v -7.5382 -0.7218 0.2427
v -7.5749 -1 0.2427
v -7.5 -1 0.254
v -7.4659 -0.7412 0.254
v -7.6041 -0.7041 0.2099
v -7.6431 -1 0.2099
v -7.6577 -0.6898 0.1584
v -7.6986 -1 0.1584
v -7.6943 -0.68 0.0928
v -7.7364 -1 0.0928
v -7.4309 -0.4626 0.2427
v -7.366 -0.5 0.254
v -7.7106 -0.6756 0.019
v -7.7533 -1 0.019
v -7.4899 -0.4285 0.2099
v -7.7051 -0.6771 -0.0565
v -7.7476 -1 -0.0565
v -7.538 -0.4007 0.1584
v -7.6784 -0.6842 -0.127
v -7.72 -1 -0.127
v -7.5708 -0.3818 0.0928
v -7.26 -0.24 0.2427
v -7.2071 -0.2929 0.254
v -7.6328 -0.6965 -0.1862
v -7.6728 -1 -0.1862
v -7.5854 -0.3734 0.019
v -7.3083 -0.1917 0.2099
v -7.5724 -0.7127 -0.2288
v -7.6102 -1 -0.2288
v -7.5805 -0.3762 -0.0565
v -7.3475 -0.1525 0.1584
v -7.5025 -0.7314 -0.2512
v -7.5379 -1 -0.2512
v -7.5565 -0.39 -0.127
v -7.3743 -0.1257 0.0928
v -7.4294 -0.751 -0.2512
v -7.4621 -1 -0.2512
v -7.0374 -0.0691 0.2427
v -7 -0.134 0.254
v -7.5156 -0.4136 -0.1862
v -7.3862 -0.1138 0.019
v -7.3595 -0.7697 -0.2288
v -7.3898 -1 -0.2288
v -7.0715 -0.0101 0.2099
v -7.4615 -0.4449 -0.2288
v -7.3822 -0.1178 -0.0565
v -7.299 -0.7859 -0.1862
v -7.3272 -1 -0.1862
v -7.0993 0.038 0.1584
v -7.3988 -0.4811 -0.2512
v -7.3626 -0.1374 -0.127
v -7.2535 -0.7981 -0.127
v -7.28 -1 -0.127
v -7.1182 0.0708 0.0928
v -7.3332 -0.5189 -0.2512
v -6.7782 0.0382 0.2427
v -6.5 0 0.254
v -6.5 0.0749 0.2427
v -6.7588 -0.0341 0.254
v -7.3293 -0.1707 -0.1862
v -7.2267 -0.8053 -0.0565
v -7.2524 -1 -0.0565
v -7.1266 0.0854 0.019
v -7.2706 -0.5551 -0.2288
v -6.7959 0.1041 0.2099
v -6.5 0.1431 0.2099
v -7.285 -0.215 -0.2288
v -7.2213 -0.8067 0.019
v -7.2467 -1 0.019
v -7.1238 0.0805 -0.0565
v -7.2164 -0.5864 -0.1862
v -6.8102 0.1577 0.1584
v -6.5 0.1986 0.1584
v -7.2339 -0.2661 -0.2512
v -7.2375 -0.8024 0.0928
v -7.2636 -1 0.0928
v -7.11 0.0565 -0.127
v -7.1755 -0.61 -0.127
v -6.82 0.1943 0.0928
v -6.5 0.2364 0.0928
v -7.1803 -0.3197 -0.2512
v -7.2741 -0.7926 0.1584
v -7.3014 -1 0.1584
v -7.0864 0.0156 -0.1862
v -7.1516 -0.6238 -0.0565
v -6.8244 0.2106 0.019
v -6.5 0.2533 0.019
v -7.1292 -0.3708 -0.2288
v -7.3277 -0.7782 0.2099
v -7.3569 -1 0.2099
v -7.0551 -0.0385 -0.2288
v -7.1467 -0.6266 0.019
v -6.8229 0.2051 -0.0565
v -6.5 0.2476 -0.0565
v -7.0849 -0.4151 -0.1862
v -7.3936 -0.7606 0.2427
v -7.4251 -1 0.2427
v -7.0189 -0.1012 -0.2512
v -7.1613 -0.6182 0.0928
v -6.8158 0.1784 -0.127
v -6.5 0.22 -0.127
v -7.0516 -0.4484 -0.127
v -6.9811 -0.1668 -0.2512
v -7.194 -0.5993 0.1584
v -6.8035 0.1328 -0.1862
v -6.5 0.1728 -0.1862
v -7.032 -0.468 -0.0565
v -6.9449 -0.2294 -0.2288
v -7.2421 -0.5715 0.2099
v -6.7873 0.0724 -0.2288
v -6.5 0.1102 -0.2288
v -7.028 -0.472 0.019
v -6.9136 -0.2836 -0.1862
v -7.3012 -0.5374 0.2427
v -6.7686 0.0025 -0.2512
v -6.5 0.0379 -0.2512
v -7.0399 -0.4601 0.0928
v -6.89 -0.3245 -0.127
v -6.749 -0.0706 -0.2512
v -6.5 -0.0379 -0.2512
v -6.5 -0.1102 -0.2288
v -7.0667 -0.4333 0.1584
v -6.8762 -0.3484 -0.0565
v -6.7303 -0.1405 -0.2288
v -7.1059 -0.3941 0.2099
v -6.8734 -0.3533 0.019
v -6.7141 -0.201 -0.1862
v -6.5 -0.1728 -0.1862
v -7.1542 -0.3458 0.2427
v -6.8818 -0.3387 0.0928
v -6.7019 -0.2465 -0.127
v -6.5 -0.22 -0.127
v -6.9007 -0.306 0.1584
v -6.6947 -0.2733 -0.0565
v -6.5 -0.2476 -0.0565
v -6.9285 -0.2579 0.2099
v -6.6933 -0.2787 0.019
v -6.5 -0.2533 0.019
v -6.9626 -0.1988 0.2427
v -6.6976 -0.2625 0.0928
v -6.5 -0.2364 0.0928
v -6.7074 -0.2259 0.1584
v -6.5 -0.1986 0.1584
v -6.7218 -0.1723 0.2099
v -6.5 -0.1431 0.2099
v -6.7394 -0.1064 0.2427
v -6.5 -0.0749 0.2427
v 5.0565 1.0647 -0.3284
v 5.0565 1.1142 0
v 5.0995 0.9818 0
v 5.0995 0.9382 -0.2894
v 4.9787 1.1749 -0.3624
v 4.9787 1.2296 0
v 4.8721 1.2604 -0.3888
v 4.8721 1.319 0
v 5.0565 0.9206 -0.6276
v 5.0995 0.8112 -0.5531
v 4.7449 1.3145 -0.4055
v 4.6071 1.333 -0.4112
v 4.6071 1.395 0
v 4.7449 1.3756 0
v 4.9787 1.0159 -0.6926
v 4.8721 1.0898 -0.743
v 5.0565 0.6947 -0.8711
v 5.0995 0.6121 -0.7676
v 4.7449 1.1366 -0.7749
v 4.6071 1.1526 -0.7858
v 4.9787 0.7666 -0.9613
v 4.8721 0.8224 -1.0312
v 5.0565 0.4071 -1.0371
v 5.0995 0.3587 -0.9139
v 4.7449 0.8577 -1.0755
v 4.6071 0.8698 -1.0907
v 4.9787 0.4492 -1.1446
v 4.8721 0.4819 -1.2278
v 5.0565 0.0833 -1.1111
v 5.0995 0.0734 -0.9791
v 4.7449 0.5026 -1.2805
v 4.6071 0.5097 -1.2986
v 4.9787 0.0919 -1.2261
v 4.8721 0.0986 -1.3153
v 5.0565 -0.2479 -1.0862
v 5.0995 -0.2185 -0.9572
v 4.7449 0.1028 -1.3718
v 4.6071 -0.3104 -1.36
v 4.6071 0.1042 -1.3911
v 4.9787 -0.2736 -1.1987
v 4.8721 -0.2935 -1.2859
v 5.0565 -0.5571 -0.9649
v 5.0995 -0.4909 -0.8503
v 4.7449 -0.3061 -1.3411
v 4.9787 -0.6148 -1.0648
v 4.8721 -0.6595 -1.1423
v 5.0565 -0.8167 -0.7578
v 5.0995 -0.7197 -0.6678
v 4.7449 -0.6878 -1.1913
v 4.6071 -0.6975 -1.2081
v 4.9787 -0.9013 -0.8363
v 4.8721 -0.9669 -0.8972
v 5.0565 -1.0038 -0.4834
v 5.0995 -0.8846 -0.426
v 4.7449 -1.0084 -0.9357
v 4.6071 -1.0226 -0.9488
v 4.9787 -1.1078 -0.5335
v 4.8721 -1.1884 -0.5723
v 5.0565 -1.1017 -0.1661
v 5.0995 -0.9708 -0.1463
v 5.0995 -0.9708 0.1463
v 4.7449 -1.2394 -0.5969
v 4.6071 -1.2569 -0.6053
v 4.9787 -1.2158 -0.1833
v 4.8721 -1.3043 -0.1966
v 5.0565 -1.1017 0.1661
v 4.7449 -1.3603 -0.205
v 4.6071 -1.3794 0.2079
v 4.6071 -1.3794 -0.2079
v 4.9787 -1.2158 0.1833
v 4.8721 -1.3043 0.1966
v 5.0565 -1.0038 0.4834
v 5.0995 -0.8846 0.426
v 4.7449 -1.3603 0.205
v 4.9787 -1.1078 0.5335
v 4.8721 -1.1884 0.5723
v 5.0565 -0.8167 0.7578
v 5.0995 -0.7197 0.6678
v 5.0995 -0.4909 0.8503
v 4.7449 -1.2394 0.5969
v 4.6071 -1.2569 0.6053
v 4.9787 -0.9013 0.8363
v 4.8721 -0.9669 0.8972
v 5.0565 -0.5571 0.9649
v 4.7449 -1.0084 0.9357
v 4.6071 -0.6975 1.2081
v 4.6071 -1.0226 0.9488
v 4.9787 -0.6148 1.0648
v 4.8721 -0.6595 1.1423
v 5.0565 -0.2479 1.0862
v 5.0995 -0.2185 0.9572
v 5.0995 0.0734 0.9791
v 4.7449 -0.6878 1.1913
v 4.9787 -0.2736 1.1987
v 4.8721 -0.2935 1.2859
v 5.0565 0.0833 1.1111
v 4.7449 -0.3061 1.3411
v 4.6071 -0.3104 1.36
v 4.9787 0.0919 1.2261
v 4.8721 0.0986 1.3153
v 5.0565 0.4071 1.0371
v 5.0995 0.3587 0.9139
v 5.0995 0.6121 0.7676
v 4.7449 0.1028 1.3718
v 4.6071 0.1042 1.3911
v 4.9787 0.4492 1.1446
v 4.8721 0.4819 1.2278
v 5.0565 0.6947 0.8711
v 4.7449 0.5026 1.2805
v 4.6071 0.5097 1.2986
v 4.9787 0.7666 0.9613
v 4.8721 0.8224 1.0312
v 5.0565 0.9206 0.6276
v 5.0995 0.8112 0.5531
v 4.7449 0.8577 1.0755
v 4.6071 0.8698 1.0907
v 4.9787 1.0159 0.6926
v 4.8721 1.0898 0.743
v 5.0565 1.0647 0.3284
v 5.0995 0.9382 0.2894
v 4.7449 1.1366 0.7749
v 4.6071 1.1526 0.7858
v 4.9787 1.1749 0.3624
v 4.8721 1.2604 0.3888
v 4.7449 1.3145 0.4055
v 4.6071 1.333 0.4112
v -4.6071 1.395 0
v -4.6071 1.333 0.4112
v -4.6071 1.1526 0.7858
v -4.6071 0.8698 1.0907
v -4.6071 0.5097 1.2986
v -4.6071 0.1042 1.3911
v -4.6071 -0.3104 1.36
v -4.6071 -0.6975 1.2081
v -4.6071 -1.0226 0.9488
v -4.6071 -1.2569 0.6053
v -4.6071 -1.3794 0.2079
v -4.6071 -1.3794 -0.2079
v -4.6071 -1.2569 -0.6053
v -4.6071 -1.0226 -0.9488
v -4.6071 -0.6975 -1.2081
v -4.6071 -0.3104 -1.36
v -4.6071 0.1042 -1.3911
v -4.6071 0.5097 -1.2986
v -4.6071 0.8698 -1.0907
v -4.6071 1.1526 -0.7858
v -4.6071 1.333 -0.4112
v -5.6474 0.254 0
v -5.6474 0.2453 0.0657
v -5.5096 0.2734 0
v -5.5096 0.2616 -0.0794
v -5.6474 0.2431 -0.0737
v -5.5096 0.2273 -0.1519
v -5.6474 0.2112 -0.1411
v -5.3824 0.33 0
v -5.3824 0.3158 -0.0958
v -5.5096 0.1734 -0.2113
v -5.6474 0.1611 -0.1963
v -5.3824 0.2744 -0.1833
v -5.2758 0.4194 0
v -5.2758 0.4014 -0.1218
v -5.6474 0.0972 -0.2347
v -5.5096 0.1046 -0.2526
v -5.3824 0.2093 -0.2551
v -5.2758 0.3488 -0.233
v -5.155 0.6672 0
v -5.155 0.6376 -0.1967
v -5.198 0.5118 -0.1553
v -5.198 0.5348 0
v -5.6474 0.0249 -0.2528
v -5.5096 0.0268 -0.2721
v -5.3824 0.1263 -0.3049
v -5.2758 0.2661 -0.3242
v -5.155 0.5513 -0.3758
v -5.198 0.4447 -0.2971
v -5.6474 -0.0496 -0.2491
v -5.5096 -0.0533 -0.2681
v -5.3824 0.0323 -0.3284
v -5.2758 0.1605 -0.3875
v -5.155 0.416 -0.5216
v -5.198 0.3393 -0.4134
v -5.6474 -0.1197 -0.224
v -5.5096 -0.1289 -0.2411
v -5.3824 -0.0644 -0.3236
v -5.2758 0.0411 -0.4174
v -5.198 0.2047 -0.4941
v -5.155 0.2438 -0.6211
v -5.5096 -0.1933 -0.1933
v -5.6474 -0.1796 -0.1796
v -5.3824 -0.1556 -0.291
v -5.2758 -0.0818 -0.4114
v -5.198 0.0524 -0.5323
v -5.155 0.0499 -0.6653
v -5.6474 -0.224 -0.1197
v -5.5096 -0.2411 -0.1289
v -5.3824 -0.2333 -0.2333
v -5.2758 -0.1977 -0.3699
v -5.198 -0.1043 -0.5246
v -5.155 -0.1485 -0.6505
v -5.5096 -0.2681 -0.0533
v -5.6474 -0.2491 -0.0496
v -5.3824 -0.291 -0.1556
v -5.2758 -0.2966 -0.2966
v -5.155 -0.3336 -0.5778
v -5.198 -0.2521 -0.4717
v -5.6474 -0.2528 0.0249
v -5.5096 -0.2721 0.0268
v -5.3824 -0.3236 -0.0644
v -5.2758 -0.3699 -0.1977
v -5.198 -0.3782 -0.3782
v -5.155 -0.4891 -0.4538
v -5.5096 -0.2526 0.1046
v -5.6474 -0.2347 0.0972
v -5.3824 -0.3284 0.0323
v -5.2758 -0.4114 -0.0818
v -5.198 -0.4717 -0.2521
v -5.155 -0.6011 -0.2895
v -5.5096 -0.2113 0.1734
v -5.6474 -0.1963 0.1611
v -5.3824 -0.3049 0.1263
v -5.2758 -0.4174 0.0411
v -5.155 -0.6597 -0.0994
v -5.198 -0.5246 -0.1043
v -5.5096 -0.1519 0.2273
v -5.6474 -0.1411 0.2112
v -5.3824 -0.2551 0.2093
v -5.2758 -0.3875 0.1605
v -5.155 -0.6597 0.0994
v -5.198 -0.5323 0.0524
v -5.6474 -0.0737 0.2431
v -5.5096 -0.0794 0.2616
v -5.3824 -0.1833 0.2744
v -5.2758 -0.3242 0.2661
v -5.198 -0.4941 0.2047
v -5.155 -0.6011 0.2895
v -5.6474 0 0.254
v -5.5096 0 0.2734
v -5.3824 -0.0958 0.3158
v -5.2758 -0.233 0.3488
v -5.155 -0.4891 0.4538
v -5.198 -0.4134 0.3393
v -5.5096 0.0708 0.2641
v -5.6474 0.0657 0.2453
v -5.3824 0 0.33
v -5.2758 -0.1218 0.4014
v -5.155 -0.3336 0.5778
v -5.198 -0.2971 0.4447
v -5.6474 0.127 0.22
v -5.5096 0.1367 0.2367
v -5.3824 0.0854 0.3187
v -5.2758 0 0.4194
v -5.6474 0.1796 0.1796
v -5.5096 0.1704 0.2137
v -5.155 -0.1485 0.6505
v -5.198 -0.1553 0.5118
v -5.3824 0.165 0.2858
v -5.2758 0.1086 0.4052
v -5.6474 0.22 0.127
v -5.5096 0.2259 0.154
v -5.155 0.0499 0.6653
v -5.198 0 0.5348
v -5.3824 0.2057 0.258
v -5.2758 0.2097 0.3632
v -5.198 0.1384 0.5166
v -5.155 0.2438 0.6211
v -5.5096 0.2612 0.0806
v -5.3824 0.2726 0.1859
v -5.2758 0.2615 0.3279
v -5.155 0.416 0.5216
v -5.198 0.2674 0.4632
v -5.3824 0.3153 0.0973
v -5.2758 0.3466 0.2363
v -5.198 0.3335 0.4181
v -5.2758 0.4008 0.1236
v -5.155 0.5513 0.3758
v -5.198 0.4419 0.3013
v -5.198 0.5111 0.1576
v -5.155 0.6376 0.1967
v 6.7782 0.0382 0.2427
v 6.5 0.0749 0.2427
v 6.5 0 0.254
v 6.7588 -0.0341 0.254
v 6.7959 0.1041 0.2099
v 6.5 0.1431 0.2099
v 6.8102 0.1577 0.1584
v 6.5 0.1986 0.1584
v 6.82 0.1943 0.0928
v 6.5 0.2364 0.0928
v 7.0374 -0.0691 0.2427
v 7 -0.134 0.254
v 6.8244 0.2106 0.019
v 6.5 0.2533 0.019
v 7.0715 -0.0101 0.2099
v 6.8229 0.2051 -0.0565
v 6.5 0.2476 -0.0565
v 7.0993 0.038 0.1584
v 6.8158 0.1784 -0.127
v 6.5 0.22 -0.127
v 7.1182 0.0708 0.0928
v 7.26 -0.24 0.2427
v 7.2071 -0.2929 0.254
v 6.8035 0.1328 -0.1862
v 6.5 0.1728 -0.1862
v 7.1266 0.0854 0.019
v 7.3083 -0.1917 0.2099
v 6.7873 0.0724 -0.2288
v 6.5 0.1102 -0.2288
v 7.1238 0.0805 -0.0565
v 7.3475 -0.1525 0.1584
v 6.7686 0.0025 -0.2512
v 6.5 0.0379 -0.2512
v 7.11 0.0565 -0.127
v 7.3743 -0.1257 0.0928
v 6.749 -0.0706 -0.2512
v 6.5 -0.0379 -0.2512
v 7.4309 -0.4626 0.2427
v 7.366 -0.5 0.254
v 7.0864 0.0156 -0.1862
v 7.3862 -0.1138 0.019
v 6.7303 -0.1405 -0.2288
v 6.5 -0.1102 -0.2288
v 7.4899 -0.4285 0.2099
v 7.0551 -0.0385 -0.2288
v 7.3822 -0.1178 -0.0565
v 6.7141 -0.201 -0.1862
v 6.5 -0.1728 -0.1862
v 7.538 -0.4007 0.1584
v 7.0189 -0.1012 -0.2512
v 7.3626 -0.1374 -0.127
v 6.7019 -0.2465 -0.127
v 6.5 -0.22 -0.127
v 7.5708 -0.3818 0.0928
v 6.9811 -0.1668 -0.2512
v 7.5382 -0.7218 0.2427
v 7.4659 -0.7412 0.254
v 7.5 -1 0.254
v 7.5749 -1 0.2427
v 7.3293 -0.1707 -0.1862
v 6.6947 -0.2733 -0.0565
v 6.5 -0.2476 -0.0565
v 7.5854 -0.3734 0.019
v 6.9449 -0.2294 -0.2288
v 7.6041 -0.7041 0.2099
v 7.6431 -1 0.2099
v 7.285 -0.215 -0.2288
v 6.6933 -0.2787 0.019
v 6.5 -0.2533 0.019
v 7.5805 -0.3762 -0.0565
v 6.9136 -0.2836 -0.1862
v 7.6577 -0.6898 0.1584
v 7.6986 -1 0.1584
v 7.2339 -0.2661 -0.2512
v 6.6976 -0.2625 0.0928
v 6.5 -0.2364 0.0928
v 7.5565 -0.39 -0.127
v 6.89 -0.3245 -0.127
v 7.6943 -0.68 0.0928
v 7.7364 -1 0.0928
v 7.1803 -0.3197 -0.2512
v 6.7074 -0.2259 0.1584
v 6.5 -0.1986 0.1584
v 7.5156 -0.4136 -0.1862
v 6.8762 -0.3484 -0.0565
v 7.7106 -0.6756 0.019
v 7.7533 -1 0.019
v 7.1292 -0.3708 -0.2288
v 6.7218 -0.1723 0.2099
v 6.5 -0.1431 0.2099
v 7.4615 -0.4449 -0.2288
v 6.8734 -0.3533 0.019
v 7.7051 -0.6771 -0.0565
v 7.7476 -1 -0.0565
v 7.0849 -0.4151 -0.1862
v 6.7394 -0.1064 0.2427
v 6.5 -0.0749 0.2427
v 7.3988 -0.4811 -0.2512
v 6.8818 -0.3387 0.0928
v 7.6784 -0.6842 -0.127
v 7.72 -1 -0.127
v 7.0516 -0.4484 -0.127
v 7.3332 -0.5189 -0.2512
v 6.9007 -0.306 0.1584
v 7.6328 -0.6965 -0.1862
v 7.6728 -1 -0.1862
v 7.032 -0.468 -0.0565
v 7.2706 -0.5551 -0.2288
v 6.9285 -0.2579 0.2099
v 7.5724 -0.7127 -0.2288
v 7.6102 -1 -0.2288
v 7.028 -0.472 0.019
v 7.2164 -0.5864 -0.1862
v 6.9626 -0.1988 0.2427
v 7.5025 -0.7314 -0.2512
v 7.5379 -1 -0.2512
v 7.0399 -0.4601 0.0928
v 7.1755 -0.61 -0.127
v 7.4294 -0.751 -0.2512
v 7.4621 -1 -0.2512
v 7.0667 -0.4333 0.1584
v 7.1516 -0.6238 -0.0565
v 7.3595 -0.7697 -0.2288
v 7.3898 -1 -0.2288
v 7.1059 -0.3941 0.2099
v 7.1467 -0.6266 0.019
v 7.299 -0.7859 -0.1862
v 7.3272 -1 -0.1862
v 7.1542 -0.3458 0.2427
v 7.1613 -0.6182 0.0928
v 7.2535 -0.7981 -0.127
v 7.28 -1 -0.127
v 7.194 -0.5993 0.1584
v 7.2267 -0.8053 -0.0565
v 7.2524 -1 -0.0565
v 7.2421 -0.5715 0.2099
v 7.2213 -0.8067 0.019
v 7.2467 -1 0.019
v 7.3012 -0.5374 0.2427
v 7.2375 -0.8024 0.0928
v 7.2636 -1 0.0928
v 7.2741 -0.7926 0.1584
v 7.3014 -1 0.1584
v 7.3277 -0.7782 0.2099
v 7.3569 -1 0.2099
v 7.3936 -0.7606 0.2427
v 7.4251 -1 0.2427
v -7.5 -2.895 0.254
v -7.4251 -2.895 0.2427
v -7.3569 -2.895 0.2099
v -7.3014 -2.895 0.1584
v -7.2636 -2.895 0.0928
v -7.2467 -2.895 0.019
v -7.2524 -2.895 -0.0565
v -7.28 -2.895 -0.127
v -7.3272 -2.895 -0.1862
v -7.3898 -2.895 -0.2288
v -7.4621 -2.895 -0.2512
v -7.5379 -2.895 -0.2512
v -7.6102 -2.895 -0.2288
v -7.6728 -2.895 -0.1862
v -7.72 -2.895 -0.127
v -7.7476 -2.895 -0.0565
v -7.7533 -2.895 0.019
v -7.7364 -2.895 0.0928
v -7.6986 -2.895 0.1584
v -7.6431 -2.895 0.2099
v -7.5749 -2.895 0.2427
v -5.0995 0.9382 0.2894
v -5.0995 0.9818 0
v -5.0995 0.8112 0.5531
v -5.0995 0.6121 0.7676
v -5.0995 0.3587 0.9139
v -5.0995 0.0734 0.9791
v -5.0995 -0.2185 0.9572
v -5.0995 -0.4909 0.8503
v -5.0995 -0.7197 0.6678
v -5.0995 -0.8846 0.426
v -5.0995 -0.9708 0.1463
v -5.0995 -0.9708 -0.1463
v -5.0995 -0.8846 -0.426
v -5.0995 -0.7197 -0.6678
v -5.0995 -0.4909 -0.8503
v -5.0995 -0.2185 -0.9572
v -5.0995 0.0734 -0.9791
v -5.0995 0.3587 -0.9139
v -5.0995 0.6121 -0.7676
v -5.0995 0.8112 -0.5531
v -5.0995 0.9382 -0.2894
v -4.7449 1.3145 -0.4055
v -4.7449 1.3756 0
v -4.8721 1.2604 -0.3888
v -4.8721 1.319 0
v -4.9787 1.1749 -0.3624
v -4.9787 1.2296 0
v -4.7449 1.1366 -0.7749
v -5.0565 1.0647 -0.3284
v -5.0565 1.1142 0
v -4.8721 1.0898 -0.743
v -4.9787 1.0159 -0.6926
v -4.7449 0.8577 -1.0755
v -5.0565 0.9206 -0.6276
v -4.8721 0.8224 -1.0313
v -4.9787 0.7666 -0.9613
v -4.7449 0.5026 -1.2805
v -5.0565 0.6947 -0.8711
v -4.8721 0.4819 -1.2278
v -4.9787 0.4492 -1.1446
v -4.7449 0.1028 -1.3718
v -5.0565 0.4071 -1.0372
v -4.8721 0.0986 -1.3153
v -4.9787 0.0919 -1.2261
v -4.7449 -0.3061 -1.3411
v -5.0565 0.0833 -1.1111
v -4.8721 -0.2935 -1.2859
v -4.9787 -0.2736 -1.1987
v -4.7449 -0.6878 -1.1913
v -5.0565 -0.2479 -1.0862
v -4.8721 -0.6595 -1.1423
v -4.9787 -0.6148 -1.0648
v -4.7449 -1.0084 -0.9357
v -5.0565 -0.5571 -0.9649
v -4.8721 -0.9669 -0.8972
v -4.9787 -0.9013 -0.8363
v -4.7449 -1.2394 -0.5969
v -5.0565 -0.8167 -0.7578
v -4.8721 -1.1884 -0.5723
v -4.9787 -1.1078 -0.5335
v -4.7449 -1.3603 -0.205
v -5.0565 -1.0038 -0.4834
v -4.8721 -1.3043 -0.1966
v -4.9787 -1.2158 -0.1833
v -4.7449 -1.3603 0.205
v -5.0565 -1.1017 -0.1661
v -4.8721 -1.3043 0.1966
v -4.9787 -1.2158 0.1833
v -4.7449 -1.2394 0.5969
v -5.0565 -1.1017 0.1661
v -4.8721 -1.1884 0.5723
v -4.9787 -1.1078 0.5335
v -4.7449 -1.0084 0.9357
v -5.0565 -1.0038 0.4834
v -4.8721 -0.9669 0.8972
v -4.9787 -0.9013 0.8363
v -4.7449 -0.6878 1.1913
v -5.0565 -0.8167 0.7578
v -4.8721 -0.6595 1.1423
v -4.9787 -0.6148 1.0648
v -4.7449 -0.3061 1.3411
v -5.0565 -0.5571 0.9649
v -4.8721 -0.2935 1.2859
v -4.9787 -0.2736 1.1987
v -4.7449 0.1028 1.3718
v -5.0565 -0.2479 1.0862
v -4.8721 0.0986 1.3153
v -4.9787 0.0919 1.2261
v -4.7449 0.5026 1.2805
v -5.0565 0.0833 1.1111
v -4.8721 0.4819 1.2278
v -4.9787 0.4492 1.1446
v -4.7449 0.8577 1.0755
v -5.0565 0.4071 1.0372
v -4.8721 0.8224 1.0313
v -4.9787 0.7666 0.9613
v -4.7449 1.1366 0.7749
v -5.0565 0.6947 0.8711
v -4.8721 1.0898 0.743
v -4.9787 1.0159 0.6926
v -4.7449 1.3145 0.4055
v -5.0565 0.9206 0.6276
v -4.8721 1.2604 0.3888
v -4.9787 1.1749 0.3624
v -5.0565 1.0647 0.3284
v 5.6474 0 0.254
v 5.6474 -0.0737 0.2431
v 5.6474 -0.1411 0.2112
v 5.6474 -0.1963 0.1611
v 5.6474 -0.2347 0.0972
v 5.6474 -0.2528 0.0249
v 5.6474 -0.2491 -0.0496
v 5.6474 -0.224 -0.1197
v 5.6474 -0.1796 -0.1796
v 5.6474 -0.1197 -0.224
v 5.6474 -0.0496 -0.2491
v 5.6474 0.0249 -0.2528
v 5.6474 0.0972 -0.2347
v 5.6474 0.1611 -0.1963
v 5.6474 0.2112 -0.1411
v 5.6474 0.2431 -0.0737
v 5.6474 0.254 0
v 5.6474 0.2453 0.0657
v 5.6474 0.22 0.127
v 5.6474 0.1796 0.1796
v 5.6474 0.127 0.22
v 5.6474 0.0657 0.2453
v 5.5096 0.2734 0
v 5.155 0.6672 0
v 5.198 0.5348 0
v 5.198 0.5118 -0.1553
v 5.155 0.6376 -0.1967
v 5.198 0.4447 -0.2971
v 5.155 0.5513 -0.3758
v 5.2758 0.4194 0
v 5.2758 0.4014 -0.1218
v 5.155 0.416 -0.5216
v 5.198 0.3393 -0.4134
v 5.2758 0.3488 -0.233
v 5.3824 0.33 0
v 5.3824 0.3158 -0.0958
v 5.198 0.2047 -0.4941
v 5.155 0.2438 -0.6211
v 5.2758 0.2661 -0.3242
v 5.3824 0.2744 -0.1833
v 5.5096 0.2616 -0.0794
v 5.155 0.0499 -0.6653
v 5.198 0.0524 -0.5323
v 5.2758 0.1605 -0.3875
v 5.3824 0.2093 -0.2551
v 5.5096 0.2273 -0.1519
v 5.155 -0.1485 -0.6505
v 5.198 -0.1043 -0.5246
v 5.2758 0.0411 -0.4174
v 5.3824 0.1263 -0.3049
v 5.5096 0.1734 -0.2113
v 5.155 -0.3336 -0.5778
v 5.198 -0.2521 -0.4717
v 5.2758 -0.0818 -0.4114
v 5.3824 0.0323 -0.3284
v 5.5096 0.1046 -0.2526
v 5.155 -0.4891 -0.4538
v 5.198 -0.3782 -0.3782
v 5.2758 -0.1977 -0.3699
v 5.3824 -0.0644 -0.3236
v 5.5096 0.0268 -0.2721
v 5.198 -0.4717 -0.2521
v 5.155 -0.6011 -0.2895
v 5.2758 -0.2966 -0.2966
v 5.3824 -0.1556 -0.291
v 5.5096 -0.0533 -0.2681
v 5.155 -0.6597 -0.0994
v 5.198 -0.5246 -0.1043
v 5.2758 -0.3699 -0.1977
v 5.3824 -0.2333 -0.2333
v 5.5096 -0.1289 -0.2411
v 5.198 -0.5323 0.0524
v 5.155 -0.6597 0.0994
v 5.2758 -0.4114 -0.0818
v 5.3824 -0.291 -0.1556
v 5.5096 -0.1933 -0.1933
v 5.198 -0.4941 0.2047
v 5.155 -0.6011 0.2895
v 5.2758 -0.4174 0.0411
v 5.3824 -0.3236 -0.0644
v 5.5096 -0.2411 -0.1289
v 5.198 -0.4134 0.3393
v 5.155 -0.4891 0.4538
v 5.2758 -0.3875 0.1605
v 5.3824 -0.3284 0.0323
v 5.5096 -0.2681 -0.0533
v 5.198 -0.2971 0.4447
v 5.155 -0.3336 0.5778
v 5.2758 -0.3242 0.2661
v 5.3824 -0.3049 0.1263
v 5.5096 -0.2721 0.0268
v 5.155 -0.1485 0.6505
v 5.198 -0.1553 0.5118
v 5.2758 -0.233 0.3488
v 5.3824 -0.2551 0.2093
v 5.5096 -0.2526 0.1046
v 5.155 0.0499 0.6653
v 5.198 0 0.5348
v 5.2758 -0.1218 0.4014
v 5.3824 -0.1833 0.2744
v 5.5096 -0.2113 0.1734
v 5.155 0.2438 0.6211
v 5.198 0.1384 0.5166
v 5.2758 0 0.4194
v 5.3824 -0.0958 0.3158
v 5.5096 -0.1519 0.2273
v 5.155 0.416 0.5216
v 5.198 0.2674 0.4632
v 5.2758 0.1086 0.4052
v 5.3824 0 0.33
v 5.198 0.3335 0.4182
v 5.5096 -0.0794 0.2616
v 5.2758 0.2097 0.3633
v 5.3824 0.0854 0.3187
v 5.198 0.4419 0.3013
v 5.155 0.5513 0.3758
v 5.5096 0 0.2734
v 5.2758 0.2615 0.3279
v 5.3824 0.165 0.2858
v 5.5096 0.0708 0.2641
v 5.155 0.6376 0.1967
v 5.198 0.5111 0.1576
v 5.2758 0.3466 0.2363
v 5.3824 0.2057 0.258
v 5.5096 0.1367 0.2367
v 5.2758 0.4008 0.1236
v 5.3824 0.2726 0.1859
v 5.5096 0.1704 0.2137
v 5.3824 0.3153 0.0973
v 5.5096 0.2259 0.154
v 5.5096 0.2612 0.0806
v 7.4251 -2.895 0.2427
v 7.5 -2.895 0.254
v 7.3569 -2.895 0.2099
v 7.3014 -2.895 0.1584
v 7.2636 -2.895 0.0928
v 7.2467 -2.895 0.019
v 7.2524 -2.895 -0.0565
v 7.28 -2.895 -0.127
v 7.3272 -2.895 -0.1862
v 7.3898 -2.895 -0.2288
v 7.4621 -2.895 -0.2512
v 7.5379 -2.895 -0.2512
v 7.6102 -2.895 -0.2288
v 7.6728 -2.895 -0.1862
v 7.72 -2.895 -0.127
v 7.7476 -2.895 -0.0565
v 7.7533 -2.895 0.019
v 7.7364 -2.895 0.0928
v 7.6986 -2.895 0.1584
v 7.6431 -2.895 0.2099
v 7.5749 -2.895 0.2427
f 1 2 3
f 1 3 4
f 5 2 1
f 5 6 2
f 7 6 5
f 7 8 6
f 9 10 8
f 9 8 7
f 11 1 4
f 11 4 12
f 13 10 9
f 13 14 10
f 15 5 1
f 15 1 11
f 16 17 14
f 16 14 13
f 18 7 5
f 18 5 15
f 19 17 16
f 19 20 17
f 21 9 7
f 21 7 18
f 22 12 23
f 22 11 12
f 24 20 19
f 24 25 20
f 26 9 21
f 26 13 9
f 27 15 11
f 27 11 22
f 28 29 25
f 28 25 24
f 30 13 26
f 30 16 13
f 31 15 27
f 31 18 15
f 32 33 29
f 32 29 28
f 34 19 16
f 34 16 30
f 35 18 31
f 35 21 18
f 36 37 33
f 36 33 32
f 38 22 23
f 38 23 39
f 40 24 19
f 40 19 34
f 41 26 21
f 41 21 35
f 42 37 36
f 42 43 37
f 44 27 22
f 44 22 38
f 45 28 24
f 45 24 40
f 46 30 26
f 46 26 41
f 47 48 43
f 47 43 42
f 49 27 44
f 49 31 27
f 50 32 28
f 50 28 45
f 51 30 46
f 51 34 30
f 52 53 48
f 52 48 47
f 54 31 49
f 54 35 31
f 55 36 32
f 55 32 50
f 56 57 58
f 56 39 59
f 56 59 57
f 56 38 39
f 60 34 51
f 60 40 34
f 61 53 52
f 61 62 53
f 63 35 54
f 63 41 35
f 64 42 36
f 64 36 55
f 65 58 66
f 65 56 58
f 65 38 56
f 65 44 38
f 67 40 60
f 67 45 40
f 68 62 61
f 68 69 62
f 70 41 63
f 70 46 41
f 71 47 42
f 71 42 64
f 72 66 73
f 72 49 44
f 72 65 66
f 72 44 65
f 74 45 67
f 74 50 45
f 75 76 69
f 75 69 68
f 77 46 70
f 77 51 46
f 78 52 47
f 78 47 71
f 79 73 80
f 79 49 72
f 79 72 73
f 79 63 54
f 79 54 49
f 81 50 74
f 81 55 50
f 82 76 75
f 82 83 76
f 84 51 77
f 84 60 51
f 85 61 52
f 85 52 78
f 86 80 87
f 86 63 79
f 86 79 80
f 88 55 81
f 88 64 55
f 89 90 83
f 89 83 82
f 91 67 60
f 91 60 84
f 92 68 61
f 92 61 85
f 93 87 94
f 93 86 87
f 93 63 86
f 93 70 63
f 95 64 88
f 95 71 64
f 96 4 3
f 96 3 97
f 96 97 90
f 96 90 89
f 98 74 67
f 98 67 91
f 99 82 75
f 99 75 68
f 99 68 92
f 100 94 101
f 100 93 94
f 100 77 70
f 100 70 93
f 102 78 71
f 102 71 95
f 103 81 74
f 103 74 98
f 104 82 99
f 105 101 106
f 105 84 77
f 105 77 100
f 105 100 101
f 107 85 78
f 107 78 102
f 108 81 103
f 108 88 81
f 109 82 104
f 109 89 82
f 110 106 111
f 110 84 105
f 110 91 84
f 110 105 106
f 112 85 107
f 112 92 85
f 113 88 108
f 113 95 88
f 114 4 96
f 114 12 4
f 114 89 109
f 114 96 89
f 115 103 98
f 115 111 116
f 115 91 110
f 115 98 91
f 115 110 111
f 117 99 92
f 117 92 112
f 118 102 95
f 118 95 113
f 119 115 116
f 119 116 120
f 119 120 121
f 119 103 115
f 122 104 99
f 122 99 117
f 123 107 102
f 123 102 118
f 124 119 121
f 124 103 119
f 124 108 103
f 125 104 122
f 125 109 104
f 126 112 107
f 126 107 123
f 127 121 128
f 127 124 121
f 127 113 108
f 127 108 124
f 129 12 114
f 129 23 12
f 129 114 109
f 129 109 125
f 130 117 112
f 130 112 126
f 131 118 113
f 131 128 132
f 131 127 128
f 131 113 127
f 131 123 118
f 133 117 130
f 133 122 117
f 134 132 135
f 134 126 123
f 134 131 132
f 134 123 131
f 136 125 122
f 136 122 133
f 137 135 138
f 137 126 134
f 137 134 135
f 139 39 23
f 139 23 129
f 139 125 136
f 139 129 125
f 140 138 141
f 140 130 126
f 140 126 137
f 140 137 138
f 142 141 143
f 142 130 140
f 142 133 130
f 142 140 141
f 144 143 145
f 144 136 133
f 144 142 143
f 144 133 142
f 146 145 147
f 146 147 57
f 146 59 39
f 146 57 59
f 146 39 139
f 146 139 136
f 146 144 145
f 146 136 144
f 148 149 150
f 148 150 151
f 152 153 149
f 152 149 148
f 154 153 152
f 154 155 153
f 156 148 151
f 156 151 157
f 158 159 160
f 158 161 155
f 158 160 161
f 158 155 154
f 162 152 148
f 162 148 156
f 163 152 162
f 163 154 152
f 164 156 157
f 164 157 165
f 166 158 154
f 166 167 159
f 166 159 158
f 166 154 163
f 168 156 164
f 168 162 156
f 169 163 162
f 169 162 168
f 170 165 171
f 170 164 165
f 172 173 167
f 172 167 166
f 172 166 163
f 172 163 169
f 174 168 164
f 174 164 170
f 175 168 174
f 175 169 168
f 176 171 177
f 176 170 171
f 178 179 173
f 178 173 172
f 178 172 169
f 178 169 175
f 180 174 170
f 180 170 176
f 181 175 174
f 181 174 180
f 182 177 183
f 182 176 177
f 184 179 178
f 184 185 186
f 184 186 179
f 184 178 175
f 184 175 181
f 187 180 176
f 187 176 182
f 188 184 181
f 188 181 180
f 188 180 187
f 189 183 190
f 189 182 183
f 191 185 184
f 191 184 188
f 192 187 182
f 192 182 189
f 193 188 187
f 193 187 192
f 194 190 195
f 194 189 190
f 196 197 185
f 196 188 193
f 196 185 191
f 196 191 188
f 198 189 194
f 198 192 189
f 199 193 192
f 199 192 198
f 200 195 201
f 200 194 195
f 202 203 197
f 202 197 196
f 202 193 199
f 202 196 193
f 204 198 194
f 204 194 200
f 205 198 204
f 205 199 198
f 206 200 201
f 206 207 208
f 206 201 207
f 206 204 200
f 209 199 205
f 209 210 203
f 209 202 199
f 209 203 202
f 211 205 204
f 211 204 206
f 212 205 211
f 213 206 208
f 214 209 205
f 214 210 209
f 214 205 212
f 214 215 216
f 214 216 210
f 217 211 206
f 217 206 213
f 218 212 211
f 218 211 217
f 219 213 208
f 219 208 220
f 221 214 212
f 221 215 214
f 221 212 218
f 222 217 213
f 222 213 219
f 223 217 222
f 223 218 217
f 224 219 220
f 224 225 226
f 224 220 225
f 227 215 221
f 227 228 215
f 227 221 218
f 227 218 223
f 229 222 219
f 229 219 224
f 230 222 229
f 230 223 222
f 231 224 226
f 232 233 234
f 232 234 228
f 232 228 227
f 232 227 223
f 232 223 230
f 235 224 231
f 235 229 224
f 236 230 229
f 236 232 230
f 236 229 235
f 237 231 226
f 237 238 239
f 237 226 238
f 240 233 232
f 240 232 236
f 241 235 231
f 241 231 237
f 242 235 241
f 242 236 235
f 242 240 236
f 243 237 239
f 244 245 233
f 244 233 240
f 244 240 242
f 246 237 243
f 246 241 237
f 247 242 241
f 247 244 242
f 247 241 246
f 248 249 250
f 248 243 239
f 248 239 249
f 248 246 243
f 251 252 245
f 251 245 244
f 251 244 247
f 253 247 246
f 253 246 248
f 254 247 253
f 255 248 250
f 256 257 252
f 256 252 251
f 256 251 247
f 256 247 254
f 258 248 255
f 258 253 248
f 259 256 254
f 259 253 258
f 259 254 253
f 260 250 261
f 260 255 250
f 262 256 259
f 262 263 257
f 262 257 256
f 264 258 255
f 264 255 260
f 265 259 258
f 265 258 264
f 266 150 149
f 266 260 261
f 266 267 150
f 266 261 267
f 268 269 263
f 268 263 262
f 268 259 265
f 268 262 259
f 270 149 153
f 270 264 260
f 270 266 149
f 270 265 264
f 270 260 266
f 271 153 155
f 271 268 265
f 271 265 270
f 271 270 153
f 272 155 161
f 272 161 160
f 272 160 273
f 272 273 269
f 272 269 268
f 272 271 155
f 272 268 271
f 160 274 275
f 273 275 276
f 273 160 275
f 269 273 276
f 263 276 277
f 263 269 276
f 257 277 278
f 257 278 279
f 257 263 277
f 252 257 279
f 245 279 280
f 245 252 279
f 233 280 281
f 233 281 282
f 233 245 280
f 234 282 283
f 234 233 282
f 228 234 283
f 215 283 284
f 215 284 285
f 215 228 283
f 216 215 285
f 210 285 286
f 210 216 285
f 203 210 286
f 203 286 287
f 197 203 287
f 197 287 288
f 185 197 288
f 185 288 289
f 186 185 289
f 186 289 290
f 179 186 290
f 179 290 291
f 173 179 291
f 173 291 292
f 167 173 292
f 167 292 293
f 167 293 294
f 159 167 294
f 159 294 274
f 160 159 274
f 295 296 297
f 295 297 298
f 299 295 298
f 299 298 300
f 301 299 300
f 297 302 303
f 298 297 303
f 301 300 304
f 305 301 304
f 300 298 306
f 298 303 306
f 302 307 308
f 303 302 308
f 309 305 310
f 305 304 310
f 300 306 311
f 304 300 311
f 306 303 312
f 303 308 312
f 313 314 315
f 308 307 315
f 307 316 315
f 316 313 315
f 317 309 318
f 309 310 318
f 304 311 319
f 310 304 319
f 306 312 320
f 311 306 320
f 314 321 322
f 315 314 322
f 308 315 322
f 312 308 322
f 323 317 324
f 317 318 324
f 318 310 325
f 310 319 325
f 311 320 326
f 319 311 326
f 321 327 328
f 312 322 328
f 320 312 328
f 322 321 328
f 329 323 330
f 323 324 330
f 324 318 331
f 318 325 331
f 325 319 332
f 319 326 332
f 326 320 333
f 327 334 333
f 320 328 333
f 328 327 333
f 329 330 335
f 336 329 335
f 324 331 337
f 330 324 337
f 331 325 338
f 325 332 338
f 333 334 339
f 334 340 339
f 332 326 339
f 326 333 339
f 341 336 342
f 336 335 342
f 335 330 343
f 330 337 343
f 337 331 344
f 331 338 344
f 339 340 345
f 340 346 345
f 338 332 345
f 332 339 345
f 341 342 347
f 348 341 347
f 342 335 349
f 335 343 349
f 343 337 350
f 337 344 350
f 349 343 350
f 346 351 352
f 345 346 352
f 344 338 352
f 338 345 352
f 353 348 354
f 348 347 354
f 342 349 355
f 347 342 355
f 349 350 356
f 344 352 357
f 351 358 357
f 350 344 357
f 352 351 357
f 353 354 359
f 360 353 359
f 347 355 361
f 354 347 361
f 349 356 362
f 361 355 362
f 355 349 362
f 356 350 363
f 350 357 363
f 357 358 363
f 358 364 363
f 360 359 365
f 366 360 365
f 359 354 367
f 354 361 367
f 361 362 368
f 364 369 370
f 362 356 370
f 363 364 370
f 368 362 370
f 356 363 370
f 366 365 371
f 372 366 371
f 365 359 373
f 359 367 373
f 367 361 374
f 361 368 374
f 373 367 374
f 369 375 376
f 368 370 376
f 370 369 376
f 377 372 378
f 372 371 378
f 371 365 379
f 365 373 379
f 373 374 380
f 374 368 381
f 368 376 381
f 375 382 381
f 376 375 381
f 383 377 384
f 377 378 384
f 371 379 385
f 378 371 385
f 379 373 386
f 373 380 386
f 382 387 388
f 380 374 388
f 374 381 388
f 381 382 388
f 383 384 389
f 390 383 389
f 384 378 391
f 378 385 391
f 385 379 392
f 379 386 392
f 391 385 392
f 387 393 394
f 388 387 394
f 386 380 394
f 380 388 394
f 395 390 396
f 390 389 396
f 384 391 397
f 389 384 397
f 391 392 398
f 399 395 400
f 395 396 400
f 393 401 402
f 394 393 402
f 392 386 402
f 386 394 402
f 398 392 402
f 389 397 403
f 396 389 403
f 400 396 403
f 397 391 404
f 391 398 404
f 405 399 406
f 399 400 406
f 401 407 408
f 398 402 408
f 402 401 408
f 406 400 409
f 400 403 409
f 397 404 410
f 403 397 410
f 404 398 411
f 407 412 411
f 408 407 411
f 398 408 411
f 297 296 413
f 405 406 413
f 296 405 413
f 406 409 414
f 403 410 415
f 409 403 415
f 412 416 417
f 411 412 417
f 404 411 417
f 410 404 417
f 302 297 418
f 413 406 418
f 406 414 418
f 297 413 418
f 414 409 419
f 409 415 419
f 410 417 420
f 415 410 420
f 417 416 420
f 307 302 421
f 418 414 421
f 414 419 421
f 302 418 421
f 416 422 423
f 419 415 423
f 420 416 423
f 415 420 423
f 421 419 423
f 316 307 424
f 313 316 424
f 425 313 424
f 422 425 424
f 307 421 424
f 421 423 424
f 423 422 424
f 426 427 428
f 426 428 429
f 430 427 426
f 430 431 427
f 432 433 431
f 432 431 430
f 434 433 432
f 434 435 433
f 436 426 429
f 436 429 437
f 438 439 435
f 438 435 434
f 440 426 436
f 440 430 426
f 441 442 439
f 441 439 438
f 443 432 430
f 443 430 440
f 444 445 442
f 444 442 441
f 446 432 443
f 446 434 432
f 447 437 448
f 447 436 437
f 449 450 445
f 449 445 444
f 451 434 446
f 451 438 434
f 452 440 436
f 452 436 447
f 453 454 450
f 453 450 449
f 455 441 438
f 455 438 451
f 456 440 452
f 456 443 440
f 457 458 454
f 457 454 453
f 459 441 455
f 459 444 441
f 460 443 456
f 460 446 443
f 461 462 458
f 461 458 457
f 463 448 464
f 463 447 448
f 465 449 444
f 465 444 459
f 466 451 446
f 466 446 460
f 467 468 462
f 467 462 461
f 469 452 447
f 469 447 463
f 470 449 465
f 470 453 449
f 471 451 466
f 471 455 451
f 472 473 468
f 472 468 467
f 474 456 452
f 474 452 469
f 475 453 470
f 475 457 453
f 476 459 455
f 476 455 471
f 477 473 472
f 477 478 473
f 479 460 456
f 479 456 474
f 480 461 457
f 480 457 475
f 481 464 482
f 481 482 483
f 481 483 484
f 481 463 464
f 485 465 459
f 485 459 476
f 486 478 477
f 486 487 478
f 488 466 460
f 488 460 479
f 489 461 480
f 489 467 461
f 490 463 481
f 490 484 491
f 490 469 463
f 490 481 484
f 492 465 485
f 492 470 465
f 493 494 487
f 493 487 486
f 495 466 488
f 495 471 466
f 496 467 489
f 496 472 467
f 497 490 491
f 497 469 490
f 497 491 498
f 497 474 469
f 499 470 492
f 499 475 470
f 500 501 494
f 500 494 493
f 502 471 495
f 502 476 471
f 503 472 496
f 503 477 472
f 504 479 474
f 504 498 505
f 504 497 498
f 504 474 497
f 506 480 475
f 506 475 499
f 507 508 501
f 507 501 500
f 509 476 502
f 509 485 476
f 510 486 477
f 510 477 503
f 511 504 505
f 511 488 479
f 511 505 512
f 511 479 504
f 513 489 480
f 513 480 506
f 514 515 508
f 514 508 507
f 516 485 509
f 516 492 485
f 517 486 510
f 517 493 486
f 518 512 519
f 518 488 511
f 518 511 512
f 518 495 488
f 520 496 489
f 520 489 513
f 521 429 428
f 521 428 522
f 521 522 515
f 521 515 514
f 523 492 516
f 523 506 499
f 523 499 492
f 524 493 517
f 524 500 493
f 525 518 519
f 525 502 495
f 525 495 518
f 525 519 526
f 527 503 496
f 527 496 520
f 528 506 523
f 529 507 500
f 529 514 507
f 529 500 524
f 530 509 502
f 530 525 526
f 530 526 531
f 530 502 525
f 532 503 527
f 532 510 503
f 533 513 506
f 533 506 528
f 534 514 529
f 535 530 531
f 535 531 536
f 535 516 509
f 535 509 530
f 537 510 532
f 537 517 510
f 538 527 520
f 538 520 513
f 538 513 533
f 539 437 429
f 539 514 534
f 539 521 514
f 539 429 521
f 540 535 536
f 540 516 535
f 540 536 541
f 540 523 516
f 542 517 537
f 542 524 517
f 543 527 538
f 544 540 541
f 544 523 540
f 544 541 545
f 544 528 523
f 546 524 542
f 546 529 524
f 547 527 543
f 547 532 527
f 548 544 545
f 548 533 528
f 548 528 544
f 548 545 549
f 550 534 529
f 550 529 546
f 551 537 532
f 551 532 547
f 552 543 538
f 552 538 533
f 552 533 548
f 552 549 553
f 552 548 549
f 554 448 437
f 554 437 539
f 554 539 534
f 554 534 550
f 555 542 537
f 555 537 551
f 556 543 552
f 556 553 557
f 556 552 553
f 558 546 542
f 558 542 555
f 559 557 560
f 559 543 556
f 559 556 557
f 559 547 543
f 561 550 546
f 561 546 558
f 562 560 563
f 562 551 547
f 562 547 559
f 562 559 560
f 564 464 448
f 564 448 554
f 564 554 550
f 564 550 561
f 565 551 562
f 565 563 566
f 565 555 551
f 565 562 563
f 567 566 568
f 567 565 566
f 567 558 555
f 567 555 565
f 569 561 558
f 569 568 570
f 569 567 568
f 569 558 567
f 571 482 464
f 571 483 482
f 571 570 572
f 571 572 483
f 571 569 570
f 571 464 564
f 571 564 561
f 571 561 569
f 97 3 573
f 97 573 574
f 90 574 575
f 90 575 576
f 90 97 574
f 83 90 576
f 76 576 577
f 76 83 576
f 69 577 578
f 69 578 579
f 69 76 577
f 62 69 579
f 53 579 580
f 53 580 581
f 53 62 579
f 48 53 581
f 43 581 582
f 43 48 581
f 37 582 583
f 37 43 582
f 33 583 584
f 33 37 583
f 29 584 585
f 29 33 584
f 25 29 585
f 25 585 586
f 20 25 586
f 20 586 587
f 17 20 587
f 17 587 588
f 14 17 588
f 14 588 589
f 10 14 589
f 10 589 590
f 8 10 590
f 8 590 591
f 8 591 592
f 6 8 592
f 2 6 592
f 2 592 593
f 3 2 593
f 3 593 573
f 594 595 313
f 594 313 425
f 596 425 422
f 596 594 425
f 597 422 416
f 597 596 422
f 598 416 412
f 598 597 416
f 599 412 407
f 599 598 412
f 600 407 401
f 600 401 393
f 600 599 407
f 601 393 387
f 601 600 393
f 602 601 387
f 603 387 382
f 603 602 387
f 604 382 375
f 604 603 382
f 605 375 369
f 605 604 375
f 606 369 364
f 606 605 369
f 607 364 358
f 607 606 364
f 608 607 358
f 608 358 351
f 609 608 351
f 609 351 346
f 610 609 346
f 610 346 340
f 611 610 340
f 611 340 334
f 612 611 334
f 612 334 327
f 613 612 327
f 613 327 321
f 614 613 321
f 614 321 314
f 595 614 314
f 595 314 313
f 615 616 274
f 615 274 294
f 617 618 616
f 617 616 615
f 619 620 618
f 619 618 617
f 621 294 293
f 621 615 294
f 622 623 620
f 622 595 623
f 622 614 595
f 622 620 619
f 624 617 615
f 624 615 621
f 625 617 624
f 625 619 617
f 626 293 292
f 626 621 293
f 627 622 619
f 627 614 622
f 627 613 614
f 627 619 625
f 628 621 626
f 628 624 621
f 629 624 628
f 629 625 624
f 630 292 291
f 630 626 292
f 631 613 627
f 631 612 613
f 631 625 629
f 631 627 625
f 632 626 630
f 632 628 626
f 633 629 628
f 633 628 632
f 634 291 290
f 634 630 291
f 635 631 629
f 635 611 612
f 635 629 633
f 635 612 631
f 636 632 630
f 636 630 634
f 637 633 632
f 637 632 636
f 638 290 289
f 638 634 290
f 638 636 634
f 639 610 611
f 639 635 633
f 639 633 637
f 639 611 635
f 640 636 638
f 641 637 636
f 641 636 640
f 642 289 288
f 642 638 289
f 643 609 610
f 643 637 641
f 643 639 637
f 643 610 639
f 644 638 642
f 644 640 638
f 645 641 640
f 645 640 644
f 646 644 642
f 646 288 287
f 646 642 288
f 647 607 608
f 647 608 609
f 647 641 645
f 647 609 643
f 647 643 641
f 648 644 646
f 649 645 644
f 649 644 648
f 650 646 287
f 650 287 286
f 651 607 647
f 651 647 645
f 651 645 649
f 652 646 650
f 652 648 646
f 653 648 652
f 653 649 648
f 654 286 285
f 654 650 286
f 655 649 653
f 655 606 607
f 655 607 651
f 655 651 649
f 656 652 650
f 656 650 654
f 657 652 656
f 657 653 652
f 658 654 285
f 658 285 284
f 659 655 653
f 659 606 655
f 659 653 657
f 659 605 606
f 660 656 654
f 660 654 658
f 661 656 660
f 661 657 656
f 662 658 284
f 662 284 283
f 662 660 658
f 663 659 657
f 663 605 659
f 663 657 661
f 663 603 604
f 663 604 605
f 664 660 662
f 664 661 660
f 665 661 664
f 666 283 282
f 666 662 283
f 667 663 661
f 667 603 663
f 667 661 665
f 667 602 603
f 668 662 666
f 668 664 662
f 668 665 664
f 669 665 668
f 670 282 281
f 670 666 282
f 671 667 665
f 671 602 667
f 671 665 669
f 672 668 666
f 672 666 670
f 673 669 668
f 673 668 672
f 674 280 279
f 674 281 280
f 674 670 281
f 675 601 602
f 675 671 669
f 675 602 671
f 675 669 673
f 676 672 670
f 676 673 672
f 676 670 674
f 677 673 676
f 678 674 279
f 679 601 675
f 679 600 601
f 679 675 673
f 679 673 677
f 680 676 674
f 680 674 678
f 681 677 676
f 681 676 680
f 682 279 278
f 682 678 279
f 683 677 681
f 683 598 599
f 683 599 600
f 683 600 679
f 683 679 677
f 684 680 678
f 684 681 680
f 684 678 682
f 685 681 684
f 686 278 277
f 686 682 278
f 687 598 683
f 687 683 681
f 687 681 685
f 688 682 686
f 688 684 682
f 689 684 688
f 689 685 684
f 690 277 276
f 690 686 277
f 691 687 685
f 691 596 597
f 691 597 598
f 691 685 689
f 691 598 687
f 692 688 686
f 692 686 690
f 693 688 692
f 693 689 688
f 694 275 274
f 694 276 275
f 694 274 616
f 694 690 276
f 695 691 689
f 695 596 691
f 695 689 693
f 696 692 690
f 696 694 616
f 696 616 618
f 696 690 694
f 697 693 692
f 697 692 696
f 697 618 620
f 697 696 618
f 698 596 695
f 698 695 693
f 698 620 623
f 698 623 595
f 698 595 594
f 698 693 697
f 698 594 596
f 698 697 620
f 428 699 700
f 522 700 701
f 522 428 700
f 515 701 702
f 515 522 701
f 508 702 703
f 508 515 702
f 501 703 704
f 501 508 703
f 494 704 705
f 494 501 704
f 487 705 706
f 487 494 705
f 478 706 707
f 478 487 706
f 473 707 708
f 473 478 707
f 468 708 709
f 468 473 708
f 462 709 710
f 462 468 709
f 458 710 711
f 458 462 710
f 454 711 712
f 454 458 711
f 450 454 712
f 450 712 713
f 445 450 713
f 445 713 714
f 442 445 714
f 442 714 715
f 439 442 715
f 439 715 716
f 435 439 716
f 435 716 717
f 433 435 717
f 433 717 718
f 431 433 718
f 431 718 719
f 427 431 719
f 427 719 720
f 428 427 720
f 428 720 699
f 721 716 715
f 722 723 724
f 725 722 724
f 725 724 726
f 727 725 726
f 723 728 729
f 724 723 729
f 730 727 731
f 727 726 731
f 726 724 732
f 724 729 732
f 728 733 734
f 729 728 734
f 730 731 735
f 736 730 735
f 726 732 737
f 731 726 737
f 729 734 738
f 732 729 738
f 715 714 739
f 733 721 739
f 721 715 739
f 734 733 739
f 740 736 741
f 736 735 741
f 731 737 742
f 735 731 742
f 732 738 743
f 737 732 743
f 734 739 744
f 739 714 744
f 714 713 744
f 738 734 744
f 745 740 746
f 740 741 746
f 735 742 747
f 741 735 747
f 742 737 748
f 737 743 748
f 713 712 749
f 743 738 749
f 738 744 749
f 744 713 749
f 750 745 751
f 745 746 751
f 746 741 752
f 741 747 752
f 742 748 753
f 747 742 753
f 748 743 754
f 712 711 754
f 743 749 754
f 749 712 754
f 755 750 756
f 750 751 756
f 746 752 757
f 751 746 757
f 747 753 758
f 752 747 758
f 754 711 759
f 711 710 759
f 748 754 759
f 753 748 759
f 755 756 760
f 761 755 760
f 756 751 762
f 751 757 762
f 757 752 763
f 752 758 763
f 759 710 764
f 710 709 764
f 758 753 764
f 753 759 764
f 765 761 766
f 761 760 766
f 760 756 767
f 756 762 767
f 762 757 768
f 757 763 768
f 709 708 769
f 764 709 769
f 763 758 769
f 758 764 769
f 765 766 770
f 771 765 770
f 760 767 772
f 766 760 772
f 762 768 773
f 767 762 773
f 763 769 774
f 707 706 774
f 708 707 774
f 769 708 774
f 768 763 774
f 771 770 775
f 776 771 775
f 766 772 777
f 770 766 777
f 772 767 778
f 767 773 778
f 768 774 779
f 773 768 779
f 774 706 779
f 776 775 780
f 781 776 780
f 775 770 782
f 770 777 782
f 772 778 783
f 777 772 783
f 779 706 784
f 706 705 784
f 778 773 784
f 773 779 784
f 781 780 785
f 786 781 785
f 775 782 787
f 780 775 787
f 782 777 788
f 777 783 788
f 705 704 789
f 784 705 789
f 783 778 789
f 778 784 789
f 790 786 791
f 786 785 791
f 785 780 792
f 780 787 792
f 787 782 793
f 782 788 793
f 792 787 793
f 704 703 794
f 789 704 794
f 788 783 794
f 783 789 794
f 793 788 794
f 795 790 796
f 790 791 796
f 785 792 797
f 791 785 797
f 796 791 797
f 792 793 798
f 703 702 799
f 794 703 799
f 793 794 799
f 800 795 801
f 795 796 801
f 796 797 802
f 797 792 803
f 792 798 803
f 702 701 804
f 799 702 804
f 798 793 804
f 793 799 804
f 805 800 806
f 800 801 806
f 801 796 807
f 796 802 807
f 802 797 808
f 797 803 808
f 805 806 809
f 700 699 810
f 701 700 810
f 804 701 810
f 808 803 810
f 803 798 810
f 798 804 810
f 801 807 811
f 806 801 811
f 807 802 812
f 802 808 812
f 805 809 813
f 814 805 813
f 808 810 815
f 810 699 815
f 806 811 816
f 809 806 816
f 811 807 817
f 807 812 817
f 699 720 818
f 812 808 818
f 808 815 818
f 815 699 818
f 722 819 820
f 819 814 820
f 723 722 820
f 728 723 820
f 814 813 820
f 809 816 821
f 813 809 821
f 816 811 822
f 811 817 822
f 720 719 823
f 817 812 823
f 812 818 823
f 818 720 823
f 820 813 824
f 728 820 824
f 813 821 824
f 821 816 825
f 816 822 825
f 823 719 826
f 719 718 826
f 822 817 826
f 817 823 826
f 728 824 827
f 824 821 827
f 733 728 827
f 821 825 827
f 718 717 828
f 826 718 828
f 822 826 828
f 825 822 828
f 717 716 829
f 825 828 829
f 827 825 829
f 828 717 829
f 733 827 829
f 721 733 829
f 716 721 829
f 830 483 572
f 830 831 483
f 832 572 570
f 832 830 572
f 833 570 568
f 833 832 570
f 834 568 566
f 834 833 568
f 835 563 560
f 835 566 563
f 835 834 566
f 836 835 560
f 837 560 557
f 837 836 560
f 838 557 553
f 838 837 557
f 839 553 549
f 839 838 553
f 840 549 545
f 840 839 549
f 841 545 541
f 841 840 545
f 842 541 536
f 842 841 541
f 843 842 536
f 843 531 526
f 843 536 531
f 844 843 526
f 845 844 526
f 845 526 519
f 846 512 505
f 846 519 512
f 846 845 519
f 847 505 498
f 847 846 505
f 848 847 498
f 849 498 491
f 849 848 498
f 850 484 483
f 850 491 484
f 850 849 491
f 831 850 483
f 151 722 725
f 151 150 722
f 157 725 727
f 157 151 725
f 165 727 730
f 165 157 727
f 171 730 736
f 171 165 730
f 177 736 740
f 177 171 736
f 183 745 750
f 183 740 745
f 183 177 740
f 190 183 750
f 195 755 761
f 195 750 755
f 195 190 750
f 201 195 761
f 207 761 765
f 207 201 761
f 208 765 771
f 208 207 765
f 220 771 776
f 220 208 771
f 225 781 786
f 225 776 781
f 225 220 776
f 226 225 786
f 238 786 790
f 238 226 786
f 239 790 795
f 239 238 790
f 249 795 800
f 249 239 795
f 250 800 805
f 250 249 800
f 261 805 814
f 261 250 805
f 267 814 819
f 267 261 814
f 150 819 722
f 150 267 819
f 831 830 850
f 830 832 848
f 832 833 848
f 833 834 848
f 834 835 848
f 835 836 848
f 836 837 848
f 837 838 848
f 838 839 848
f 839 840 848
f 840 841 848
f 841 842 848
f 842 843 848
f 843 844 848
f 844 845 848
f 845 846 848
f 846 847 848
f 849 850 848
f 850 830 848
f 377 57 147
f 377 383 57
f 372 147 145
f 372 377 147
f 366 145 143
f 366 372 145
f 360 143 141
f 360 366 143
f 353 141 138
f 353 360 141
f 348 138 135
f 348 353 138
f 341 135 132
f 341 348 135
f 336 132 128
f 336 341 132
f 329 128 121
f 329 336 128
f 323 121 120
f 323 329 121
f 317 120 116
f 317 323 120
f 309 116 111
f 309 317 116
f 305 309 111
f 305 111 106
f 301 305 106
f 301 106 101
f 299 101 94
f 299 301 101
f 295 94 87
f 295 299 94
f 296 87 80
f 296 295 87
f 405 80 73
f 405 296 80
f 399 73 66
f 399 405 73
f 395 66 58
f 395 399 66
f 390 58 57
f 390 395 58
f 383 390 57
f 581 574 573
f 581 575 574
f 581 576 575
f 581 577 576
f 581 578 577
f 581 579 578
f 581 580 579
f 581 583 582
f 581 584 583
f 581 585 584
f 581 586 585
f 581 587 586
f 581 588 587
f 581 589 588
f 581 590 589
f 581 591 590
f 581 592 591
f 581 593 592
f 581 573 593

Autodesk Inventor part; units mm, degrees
ref_plane "YZ Plane" through (0, 0, 0) normal (1, 0, 0) x (0, 1, 0)
ref_plane "XZ Plane" through (0, 0, 0) normal (0, 1, 0) x (-1, 0, 0)
ref_plane "XY Plane" through (0, 0, 0) normal (0, 0, 1) x (1, 0, 0)
sketch "Sketch1" plane through (0, 0, 0) normal (0, 0, 1) x (1, 0, 0)
  line L0 (-5.6474, 0) -> (5.6474, 0)
  line L1 (5.6474, 0) -> (5.6474, 0.254)
  arc A0 (5.155, 0.6672) -> (5.6474, 0.254) centre (5.6474, 0.754) ccw
  line L2 (5.155, 0.6672) -> (5.0995, 0.9818)
  arc A1 (5.0995, 0.9818) -> (4.6071, 1.395) centre (4.6071, 0.895) ccw
  line L3 (-5.6474, 0) -> (-5.6474, 0.254)
  arc A2 (-5.6474, 0.254) -> (-5.155, 0.6672) centre (-5.6474, 0.754) ccw
  line L4 (-5.155, 0.6672) -> (-5.0995, 0.9818)
  arc A3 (-4.6071, 1.395) -> (-5.0995, 0.9818) centre (-4.6071, 0.895) ccw
  line L5 (-4.6071, 1.395) -> (4.6071, 1.395)
  point P0 (0, 0)
  point P1 (0, 0)
  dimension "d0" = 2.79
  dimension "d1" = 0.508
  dimension "d2" = 10.31
  dimension "d3" = 0.5
  dimension "d6" = 0.5
  dimension "d7" = 80
revolve "Revolution1" add sketch "Sketch1" angle 360 about axis through (-5.6474, 0, 0) along (1, 0, 0)
sketch "Sketch2" plane through (0, 0, 0) normal (0, 0, 1) x (1, 0, 0)
  line L0 (-5.6474, -0.254) -> (-5.6474, 0.254) projected
  line L1 (5.6474, -0.254) -> (5.6474, 0.254) projected
  line L2 (-7.5, -2.895) -> (-7.5, -1)
  arc A0 (-6.5, 0) -> (-7.5, -1) centre (-6.5, -1) ccw
  line L3 (-6.5, 0) -> (6.5, 0)
  arc A1 (7.5, -1) -> (6.5, 0) centre (6.5, -1) ccw
  line L4 (7.5, -1) -> (7.5, -2.895)
  arc A2 (-5.0995, -0.9818) -> (-4.6071, -1.395) centre (-4.6071, -0.895) ccw projected
  point P0 (0, 0)
  point P1 (0, 0)
  point P2 (-4.6071, -1.395)
  dimension "d9" = 1
  dimension "d10" = 0.8526
  dimension "d11" = 15
  dimension "d12" = 2.895
  dimension "d13" = 1.5
sketch "Sketch3" plane through (-5.6474, 0, 0) normal (-1, 0, 0) x (0, 0, 1)
  circle A0 centre (0, 0) radius 0.254 projected
sweep "Sweep1" add profiles "Sketch3" path "Sketch2" path curves L2 A0 L3 A1 L4
properties part number "Resistor_TH-15mm" material "Copper"
